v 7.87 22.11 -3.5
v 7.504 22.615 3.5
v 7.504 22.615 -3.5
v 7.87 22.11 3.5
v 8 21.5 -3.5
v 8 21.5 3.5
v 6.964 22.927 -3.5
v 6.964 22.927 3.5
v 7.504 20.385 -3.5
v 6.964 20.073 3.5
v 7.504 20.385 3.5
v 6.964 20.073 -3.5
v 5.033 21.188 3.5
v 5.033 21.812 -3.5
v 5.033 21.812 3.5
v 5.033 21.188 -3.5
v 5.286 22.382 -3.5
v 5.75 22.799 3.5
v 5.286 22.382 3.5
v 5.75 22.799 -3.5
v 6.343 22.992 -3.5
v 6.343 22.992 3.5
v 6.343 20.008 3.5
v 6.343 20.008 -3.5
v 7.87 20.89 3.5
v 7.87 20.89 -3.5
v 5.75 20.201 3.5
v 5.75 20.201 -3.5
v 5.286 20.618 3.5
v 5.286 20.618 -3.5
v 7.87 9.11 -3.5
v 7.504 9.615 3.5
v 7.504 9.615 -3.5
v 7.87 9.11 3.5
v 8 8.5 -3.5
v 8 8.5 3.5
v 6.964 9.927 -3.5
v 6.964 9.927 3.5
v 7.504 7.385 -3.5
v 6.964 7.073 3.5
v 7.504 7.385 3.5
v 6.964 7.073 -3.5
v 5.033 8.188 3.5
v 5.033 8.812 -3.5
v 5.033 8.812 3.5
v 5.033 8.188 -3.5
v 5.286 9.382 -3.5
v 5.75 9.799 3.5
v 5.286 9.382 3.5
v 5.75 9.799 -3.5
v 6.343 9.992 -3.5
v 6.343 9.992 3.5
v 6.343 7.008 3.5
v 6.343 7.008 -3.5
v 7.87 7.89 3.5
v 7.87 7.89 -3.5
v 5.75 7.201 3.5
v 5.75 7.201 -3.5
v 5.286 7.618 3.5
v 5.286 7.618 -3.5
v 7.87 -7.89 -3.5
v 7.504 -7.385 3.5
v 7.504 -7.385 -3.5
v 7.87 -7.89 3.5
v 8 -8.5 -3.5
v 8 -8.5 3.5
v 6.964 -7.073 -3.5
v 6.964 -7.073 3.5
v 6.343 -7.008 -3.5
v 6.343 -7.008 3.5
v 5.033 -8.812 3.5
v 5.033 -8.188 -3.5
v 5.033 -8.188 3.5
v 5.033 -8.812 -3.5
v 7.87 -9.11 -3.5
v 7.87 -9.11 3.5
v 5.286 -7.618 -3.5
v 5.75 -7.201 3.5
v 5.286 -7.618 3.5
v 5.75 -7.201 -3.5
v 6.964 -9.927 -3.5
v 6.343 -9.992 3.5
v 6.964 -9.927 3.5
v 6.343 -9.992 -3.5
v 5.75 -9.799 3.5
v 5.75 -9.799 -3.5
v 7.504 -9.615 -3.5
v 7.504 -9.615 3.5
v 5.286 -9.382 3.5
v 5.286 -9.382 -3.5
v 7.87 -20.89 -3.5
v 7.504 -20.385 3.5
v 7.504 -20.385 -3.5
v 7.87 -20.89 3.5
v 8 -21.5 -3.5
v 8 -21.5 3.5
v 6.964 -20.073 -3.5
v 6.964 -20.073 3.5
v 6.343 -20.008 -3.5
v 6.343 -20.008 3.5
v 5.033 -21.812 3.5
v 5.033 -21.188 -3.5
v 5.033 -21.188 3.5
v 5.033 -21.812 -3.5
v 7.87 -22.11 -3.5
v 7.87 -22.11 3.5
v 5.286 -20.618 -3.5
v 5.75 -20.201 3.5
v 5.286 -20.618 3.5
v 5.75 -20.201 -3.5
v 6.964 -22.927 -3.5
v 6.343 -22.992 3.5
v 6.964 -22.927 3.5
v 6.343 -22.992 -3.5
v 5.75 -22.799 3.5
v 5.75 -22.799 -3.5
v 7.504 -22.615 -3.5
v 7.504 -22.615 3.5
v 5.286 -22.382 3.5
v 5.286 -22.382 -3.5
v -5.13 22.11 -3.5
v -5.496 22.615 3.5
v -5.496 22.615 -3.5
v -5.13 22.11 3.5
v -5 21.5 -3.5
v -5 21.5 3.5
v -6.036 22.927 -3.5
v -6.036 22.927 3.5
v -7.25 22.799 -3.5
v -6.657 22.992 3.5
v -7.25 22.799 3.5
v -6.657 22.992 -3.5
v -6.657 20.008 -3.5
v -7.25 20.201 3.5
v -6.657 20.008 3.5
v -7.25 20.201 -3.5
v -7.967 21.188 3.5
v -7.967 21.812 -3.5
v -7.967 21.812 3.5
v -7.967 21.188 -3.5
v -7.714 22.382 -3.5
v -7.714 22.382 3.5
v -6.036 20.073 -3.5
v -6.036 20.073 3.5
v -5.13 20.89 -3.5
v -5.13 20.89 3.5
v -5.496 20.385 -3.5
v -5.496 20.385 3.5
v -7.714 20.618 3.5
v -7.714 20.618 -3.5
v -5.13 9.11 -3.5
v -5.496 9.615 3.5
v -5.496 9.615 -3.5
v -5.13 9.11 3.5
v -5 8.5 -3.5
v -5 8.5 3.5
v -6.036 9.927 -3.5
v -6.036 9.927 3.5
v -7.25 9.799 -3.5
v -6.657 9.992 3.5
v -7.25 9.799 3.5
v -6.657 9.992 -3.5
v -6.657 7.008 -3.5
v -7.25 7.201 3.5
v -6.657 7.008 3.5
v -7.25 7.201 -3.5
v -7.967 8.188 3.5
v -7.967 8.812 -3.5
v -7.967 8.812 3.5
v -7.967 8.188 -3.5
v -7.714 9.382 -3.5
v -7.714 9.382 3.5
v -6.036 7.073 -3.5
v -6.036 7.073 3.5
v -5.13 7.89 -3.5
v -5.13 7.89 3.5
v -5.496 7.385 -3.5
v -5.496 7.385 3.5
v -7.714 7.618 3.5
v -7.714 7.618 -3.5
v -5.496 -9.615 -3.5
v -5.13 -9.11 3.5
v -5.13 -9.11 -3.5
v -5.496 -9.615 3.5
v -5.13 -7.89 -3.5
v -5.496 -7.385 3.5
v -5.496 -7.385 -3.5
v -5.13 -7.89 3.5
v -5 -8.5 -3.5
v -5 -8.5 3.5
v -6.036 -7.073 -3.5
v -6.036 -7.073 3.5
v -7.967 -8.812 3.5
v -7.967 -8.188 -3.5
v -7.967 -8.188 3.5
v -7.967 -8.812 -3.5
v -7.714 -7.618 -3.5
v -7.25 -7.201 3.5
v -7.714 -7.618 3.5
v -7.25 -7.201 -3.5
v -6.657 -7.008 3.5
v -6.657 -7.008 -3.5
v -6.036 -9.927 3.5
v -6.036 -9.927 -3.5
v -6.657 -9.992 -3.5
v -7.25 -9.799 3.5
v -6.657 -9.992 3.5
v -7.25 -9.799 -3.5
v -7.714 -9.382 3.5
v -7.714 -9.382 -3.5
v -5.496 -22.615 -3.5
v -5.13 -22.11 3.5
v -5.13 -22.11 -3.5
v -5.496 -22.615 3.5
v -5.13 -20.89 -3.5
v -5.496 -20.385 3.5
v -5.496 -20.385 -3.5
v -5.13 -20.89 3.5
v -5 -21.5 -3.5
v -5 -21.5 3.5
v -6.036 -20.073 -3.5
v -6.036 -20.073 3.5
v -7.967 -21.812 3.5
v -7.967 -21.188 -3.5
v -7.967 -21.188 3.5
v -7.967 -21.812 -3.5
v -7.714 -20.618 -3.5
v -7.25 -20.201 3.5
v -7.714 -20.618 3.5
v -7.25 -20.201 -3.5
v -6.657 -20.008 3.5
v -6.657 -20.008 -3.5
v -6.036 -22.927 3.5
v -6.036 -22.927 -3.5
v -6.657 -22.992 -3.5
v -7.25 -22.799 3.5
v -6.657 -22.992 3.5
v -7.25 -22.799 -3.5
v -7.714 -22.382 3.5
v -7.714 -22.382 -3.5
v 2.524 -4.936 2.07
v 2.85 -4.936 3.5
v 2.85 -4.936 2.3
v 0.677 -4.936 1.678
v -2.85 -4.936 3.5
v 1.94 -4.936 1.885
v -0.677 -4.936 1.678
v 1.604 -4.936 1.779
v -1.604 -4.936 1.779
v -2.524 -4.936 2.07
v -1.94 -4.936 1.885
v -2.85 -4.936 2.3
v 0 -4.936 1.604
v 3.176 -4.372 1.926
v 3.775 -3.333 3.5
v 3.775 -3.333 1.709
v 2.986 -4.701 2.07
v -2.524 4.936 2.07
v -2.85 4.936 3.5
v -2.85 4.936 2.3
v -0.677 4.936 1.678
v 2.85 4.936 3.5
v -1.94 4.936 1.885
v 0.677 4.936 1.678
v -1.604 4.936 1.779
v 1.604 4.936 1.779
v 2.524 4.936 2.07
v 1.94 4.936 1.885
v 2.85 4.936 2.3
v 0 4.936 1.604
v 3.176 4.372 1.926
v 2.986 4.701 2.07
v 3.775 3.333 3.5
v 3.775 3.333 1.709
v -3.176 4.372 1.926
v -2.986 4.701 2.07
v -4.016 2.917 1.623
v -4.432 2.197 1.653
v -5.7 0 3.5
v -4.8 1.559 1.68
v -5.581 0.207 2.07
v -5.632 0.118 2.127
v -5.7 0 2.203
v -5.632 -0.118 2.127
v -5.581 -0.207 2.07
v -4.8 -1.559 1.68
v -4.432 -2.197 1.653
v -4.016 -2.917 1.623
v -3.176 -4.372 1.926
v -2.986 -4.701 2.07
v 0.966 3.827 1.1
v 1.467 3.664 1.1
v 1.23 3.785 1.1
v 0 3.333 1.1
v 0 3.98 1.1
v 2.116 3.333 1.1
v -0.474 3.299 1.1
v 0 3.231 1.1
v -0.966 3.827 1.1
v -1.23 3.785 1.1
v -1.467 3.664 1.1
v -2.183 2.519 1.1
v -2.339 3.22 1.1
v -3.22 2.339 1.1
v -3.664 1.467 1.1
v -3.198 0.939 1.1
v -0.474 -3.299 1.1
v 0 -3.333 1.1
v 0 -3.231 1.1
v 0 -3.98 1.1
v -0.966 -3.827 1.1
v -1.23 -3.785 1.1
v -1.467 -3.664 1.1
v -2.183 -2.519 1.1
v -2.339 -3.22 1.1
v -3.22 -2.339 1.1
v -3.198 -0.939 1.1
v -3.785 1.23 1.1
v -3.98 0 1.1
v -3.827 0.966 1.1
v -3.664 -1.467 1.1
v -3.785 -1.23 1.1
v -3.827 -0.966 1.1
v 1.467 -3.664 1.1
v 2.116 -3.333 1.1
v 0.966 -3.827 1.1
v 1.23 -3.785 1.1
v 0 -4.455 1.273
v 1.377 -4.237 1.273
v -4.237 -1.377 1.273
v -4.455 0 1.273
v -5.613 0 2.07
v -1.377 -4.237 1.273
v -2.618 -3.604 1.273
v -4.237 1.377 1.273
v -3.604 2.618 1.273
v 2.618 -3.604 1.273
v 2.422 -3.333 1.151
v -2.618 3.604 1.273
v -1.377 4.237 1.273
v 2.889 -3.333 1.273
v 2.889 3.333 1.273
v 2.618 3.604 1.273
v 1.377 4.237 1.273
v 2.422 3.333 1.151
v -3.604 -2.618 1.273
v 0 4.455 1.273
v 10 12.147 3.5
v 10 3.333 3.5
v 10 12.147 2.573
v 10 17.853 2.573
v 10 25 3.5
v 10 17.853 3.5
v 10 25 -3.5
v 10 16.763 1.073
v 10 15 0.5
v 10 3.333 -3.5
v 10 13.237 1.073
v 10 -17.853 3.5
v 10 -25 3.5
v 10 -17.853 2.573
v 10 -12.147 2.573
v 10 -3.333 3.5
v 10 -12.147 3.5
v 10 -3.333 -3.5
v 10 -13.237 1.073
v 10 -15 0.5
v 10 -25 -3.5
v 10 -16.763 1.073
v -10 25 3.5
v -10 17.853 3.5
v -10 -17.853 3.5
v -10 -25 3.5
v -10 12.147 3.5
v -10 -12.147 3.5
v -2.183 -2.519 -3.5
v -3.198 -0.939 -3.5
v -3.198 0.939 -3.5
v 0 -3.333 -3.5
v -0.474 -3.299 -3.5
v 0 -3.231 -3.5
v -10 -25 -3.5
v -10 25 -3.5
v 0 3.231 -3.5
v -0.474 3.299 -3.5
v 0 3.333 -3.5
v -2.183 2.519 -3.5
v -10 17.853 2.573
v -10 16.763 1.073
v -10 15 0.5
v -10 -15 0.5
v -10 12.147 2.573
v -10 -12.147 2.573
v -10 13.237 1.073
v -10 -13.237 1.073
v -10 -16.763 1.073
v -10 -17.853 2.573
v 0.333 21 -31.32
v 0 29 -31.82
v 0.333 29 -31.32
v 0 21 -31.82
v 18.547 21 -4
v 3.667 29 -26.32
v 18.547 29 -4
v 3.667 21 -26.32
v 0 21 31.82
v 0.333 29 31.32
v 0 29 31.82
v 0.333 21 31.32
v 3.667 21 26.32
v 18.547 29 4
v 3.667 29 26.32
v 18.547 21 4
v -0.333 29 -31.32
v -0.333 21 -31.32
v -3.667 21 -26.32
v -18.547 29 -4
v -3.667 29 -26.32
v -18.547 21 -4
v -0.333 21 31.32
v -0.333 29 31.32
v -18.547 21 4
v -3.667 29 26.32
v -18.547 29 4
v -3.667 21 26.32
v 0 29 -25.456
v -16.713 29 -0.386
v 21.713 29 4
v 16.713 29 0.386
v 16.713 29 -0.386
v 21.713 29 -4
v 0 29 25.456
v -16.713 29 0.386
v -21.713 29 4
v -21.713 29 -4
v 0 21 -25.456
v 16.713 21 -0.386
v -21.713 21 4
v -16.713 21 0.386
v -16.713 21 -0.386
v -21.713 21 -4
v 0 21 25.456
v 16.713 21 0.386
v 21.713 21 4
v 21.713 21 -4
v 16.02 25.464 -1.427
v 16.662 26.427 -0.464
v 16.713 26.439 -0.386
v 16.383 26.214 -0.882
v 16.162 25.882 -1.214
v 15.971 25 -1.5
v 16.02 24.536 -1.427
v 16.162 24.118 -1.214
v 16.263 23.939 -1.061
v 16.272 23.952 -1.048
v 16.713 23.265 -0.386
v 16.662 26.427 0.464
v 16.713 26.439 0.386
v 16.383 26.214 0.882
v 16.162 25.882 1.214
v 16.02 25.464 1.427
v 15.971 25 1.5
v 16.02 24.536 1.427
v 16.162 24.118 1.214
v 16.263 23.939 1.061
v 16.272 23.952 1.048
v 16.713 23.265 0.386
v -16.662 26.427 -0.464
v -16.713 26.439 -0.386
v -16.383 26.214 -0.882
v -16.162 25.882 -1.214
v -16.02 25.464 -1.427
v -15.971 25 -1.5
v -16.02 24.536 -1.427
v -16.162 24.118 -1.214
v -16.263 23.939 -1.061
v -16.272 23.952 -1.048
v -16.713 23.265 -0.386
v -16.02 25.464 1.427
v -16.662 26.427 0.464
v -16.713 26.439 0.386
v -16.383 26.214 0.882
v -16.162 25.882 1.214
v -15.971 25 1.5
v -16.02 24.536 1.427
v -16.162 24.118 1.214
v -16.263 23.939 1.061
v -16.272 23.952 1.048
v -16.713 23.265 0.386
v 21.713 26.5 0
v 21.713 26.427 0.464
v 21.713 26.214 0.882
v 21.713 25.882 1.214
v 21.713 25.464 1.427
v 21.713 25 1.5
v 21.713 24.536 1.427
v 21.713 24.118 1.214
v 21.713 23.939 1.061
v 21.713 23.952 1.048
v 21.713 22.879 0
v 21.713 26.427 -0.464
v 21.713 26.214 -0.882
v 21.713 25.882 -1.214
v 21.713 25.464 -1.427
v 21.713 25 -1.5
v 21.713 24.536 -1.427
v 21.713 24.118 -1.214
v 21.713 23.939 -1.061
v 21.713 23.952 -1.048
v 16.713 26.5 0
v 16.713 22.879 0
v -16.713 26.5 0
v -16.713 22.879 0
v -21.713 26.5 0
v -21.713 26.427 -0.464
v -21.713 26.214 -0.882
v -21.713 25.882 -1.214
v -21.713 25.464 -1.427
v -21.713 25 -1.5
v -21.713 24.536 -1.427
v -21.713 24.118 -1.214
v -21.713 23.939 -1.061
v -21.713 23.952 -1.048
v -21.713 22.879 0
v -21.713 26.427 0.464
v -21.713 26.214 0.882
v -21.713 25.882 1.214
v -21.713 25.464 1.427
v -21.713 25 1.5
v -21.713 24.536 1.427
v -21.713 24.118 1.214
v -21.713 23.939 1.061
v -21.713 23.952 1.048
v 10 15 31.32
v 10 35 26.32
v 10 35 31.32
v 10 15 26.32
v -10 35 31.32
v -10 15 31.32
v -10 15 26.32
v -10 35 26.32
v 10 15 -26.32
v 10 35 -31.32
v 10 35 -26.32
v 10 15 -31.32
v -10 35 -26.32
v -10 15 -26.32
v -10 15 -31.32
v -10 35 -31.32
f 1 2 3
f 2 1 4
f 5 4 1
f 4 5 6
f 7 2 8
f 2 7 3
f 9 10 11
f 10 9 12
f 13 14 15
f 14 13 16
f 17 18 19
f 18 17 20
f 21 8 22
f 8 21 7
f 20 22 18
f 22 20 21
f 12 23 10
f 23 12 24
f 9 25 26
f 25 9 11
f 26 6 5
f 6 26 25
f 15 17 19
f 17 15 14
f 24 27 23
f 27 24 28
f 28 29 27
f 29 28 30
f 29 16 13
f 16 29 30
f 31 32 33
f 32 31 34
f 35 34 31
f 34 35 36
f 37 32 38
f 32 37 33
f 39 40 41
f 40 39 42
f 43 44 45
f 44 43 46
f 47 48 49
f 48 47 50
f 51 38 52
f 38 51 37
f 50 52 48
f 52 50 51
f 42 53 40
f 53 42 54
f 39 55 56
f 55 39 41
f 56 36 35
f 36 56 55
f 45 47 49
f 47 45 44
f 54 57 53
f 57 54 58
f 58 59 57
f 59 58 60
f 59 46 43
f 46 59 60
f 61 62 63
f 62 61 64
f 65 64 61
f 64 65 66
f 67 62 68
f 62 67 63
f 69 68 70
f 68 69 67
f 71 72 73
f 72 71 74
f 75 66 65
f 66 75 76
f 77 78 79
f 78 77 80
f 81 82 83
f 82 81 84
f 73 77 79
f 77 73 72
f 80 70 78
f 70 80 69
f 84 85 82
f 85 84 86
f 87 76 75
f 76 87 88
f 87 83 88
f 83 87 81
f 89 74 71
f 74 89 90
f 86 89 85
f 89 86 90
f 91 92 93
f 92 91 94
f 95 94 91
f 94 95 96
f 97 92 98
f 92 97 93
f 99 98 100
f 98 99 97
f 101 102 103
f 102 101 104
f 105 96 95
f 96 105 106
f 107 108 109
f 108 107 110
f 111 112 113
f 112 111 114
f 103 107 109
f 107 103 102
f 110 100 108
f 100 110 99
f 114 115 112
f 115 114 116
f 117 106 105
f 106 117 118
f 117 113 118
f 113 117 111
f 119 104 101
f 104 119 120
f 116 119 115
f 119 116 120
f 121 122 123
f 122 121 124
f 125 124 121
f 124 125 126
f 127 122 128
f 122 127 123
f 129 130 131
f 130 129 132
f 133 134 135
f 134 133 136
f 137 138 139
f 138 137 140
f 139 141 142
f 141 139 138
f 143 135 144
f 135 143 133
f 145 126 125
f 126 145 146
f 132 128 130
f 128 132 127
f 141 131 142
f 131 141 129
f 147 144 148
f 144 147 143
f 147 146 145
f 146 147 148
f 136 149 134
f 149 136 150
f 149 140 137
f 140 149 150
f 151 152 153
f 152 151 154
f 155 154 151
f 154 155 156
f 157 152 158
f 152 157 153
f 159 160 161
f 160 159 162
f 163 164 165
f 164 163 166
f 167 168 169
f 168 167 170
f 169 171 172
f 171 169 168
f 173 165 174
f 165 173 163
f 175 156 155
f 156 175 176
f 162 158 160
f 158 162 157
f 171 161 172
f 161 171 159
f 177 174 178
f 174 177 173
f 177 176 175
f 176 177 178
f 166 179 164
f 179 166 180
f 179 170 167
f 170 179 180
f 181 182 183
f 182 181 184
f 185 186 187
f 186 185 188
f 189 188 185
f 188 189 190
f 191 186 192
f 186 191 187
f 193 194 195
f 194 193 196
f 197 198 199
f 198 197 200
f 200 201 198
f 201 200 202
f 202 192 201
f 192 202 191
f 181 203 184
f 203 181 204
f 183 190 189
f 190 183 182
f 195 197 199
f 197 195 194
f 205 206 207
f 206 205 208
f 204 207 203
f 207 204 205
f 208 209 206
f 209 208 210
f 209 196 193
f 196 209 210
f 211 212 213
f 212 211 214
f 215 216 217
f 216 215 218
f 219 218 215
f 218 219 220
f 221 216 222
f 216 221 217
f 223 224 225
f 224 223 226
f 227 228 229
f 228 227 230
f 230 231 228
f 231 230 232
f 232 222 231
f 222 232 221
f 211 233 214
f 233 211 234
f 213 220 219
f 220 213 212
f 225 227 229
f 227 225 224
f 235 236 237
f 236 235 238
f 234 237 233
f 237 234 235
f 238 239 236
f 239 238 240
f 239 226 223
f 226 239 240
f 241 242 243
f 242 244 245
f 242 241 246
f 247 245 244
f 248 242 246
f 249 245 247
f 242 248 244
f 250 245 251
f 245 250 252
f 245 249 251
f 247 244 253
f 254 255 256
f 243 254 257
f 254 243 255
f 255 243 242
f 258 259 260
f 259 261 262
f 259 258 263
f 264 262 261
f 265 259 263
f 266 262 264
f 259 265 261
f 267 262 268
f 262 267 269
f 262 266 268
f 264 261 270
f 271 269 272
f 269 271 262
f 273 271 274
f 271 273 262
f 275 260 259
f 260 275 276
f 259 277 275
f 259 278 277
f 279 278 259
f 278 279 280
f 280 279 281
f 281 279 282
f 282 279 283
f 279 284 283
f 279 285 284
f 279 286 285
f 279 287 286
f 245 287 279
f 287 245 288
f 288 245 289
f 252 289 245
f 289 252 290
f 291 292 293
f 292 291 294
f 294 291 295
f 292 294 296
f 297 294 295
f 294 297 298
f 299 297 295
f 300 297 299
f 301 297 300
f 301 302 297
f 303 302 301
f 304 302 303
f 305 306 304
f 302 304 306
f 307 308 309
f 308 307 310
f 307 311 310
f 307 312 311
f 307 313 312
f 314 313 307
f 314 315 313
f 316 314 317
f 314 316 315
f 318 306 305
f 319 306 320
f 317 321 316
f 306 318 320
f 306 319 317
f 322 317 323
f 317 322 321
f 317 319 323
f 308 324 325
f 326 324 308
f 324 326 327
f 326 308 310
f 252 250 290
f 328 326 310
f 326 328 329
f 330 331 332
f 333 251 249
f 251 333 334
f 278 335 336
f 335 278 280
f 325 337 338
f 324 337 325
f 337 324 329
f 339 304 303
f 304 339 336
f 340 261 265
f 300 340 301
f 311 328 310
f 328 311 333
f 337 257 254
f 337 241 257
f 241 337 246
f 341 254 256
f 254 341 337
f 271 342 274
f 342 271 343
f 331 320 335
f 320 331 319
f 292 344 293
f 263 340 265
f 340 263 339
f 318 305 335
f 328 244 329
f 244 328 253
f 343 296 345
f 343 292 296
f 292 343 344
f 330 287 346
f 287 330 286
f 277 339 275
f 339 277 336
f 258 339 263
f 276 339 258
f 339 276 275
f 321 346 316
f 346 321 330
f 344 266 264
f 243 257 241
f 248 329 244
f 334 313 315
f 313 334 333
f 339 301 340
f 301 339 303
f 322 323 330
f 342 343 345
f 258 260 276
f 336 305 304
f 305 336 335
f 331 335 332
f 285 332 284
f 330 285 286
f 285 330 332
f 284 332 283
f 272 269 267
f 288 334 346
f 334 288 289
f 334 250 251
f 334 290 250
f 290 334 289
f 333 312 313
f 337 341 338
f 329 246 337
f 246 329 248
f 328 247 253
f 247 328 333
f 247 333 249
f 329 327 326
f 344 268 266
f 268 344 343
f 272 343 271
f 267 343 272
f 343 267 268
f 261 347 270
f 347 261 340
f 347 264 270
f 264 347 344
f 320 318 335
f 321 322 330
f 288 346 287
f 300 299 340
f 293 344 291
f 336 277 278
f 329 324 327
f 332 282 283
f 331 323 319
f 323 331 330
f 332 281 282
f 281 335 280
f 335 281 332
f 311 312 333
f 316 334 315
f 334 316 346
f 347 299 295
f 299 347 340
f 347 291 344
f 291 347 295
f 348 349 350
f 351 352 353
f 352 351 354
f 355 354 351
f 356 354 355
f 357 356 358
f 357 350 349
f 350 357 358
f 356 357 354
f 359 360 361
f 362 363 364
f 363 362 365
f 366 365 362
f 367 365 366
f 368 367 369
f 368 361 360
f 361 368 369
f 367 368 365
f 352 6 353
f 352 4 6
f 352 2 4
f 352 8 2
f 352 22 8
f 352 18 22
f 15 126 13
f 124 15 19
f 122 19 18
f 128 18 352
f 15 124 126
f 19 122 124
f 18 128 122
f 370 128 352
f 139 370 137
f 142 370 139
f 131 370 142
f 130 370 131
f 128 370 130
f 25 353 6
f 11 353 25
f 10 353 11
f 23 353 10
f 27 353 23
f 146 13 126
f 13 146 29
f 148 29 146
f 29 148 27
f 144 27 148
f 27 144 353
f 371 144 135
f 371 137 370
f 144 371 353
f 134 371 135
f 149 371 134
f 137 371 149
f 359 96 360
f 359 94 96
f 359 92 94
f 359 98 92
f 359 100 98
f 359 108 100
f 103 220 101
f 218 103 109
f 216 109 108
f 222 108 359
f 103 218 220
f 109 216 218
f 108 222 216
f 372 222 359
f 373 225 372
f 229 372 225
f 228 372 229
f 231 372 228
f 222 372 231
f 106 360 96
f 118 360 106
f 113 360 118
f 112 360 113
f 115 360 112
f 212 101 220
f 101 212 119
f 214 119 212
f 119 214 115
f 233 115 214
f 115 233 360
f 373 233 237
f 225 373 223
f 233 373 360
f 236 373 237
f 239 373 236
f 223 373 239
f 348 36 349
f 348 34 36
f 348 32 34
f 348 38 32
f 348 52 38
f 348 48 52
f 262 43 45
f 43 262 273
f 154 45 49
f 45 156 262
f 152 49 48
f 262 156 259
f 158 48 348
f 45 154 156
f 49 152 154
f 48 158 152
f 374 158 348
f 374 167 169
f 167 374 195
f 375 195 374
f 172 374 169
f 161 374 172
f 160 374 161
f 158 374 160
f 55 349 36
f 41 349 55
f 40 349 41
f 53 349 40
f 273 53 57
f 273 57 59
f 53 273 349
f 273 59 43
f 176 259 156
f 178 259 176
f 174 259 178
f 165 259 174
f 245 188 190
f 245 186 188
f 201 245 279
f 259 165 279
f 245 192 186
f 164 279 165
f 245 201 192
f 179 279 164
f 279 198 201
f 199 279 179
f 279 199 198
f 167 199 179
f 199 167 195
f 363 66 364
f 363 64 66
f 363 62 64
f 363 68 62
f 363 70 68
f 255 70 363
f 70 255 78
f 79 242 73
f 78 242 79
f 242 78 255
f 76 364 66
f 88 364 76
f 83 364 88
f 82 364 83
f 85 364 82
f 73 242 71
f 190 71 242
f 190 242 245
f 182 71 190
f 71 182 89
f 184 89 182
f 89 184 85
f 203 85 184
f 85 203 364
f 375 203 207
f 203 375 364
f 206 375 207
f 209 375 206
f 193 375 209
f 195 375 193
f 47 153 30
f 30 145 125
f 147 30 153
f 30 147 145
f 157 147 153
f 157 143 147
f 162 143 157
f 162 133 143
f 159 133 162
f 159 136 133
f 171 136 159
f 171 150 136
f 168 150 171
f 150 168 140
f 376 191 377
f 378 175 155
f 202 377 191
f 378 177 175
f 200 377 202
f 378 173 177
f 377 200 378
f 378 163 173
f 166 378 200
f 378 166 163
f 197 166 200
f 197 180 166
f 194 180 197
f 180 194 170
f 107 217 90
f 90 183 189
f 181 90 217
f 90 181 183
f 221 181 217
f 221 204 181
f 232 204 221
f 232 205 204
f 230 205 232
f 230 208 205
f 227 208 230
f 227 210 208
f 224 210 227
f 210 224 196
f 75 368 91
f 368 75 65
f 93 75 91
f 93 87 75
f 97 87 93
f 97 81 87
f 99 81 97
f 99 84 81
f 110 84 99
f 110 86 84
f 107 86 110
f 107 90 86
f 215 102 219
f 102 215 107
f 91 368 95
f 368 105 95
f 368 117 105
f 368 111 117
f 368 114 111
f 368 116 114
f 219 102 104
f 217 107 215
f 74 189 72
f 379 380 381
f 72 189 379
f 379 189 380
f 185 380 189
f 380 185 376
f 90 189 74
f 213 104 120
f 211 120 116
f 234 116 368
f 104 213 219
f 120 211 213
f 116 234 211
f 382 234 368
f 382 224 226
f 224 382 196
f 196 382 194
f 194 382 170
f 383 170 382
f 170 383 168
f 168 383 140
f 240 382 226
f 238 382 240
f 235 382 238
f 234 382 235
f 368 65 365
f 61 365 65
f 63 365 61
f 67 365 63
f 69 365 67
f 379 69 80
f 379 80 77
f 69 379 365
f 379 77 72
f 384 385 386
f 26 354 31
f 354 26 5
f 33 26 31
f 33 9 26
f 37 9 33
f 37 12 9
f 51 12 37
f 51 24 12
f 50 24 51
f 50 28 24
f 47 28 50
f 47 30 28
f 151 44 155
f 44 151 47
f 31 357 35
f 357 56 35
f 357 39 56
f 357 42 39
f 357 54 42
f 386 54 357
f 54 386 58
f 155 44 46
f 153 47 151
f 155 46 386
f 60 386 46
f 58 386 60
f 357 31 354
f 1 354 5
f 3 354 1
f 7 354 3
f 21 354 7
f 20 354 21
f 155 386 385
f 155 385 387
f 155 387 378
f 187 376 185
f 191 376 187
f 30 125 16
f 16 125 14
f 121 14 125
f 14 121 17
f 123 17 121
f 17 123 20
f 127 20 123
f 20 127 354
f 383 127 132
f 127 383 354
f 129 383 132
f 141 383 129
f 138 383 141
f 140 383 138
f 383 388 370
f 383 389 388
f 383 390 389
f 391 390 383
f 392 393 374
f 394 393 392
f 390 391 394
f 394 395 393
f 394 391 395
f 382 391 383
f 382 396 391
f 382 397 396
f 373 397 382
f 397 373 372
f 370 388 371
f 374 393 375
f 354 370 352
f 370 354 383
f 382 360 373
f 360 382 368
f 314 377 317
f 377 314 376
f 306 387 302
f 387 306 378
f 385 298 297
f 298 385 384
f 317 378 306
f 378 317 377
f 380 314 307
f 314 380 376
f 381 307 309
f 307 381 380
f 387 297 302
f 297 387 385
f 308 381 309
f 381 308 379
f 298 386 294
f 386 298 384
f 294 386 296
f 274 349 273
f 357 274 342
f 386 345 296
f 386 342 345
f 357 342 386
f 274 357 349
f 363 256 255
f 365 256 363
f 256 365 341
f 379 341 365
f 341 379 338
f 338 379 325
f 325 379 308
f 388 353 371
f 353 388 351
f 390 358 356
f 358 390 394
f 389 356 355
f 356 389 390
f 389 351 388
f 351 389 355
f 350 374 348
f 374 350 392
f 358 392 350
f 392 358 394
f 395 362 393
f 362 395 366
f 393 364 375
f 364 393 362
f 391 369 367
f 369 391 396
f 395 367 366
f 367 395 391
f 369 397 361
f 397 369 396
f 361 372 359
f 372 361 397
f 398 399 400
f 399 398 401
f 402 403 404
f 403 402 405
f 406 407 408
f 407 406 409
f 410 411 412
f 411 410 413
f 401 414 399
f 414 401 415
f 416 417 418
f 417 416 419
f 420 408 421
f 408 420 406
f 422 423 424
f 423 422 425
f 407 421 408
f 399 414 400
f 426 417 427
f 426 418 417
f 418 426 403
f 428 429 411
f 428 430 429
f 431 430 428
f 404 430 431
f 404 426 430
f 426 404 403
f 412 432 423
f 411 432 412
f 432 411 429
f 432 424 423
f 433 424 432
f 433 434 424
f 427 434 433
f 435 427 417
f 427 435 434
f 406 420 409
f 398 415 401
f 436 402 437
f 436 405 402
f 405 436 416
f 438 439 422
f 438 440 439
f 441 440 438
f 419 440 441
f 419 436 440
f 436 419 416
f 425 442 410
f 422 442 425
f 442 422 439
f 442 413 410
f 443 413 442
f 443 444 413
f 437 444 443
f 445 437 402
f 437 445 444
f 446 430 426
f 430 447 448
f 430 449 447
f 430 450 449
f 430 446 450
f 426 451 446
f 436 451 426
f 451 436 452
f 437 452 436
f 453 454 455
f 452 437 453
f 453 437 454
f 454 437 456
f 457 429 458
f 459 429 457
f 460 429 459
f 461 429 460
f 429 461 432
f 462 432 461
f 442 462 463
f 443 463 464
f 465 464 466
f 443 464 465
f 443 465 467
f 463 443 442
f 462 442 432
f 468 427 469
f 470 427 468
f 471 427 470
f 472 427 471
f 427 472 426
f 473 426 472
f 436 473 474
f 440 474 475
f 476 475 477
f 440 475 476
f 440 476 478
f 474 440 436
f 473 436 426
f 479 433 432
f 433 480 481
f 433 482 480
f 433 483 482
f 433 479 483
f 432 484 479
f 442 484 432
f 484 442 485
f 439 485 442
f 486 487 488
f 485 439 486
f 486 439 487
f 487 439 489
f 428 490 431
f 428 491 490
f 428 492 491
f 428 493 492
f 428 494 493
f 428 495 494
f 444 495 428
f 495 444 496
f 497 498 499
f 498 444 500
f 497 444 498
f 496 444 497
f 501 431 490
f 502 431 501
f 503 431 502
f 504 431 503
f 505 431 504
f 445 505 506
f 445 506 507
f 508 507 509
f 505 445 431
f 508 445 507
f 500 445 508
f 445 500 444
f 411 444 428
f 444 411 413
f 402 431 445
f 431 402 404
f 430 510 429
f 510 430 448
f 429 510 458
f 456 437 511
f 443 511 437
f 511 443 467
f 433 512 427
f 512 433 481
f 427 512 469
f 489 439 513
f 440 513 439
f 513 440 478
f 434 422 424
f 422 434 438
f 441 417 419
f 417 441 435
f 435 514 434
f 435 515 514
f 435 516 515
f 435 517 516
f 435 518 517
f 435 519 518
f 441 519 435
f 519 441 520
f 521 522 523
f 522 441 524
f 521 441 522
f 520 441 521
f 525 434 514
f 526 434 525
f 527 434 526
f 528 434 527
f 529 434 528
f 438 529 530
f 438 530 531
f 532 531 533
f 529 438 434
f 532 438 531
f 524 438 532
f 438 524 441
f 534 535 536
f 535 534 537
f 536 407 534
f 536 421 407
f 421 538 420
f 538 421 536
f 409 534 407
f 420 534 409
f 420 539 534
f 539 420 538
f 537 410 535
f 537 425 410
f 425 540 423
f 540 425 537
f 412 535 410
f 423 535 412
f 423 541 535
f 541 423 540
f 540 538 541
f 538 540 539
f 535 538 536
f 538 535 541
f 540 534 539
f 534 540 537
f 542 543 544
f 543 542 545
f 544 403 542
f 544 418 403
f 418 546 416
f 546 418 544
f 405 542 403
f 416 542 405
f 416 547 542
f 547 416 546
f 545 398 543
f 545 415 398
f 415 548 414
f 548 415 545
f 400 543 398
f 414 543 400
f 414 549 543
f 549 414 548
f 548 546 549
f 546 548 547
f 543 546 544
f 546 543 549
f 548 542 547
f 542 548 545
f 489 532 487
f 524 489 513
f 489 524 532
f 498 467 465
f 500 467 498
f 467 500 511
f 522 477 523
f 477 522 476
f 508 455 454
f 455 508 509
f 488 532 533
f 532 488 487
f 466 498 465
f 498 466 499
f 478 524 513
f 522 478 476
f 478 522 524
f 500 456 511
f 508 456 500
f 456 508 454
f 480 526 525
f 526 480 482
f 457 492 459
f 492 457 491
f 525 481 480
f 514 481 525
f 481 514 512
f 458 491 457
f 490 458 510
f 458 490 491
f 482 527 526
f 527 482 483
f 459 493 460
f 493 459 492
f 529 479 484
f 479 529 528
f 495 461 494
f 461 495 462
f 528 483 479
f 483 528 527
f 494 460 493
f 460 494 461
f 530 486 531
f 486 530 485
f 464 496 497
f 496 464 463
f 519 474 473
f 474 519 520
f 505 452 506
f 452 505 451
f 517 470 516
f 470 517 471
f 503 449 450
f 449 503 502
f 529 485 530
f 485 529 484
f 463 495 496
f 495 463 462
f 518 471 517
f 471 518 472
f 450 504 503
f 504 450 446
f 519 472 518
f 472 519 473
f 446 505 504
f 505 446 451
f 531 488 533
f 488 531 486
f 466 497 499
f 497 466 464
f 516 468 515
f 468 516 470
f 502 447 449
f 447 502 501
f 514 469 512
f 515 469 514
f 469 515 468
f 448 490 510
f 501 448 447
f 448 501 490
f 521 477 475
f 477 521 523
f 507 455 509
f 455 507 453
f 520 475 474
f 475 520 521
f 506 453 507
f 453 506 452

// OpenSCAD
// file: library.scad
include <parameters.scad>;


// inner and outer product.  Why aren't these standard?!!!?

function ip(v1 = [0,0,0], v2 = [0,0,0]) = v1.x*v2.x + v1.y*v2.y + v1.z*v2.z;

function op(v1 = [0,0,0], v2 = [0,0,0]) = [v1.y*v2.z - v1.z*v2.y, v1.z*v2.x - v1.x*v2.z, v1.x*v2.y - v1.y*v2.x];


/*
  This makes an angled strut in space between two points.  It is parallel to one of the
  coordinate planes, which means that one coordinate of the two endpoints must be the same.


module strut(p1=[0,0,0], p2=[0,0,1], deep = 5, wide = 10)
{
	if(abs(p1.x - p2.x) < 0.00001)
	{

	} else if(abs(p1.y - p2.y) < 0.00001)
	{

	} else
	{

		cube([sqrt(

	}
}
*/

/*
  This gives either a NEMA 14 stepper motor or its mounting holes.

  If body is true, you get the motor.  If it is false you get the screw holes and central
  hole needed to mount the motor.  If counterbore is positive and you are generating the mounting holes
  then the screw holes will get fat to accomodate a cap-screw head counterbore mm away from the face 
  of the motor.  For no counterbores, set counterbore negative.

*/

module nema14(body = true, counterbore = -1)
{
	color([1,0.4,0.4,1])
	union()
	{
		if(body)
		{
			translate([0, 0, nema14_shaft_length/2 - nema14_shaft_projection - nema14_hub_depth])
				cylinder(r = nema14_shaft/2, h = nema14_shaft_length, center = true, $fn=20);
			translate([0, 0, -nema14_hub_depth])
				cylinder(r = nema14_hub/2, h = nema14_hub_depth*2, center = true, $fn=20);
	
			translate([0, 0, nema14_length/2])
				cube([nema14_square,nema14_square,nema14_length], center = true);
		} else
			translate([0, 0, -20])
				cylinder(r = nema14_hub/2 + 1, h = 50, center = true, $fn=20);

		if(!body)
		{
			union()
			{
				for ( x = [0:1] ) 
				for ( y = [0:1] )
				{
					translate([(x-0.5)*nema14_screws, (y-0.5)*nema14_screws, -20])
						cylinder(r = screwsize/2, h = 50, center = true, $fn=10);
					if(counterbore >= 0)
						translate([(x-0.5)*nema14_screws, (y-0.5)*nema14_screws, -25-counterbore])
							cylinder(r = screwsize, h = 50, center = true, $fn=10);
				}
			}
		}
	}


}


// Pentagon nut that matches a hexagon...

module pentanut(height=40)
{
	rotate([0,0,60])
	intersection()
	{
		translate([-nutsize,-nutsize*5,-20])
			cube([nutsize*10, nutsize*10,height]);
		rotate([0,0,60])
			translate([-nutsize,-nutsize*5,-20])
				cube([nutsize*10, nutsize*10,height]);
		rotate([0,0,120])
			translate([-nutsize,-nutsize*5,-20])
				cube([nutsize*10, nutsize*10,height]);
		rotate([0,0,180])
			translate([-nutsize,-nutsize*5,-20])
				cube([nutsize*10, nutsize*10,height]);
		rotate([0,0,240])
			translate([-nutsize,-nutsize*5,-20])
				cube([nutsize*10, nutsize*10,height]);
	}
}


// Make a RepRap teardrop with its axis along Z
// If truncated is true, chop the apex; if not, come to a point

// I stole this function from Erik...


module teardrop(r=1.5, h=20, truncateMM=0.5)
{
	union()
	{
		if(truncateMM > 0)
		{
			intersection()
			{
				translate([truncateMM,0,h/2]) 
					scale([1,1,h])
						cube([r*2.8275,r*2,1],center=true);
				scale([1,1,h]) 
						rotate([0,0,3*45])
							cube([r,r,1]);
			}
		} else
		{
			scale([1,1,h])
				rotate([0,0,3*45])
					cube([r,r,1]);
		}
		cylinder(r=r, h = h, $fn=20);
	}
}


// Make a ball-bearing holder cutout

module bearing_holder(radius = 6.5)
{
	union()
	{
		cylinder (h = radius*20, r = radius, center = true, $fn = 20);
		for(i=[0:2])
		{
			rotate([0,0,120*i])
				translate([radius+screwsize/2, 0, 0])
					union()
					{
						cylinder (h = radius*20, r = screwsize/2, center = true, $fn = 20);
						translate([-screwsize, 0, 0])
							cube([2*screwsize, screwsize, radius*20], center = true);
					}
		}
	}
}

// Make a cuboid with a 45 degree top for vertical slots etc

module cen_hat(size)
{
	translate([0, 0, size.x/sqrt(2)])
		union()
		{
			rotate([0, 45, 0])
				cube([size.x, size.y, 5*max(size.x, max(size.y, size.z))], center=true);
			rotate([0, -45, 0])
				cube([size.x, size.y, 5*max(size.x, max(size.y, size.z))], center=true);
		}
}

module hat_cube(size = [1,1,1], center = false)
{
	difference()
	{
		cube(size, center);
		if(center)
			translate([0, 0, size.z/2])
				cen_hat(size);
		else
			translate([size.x/2, size.y/2, size.z])
				cen_hat(size);
	}
}



module rod(length, threaded) if (threaded && renderrodthreads) {
	linear_extrude(height = length, center = true, convexity = 10, twist = -360 * length / rodpitch, $fn = fn)
		translate([rodsize * 0.1 / 2, 0, 0])
			circle(r = rodsize * 0.9 / 2, $fn = fn);
} else cylinder(h = length, r = rodsize / 2, center = true, $fn = fn);


module rodnut(position, washer) render() translate([0, 0, position]) {
	intersection() {
		scale([1, 1, 0.5]) sphere(r = 1.05 * rodsize, center = true);
		difference() {
			cylinder (h = rodnutsize, r = rodnutdiameter / 2, center = true, $fn = 6);
			rod(rodnutsize + 0.1);
		}
	}
	if (washer == 1 || washer == 4) rodwasher(((position > 0) ? -1 : 1) * (rodnutsize + rodwashersize) / 2);
	if (washer == 2 || washer == 4) rodwasher(((position > 0) ? 1 : -1) * (rodnutsize + rodwashersize) / 2);
}


module rodwasher(position) render() translate ([0, 0, position]) difference() {
	cylinder(r = rodwasherdiameter / 2, h = rodwashersize, center = true, $fn = fn);
	rod(rodwashersize + 0.1);
}


module screw(length, nutpos, washer, bearingpos = -1) union(){
	translate([0, 0, -length / 2]) if (renderscrewthreads) {
		linear_extrude(height = length, center = true, convexity = 10, twist = -360 * length / screwpitch, $fn = fn)
			translate([screwsize * 0.1 / 2, 0, 0])
				circle(r = screwsize * 0.9 / 2, $fn = fn);
	} else cylinder(h = length, r = screwsize / 2, center = true, $fn = fn);
	render() difference() {
		translate([0, 0, screwsize / 2]) cylinder(h = screwsize, r = screwsize, center = true, $fn = fn);
		translate([0, 0, screwsize]) cylinder(h = screwsize, r = screwsize / 2, center = true, $fn = 6);
	}
	if (washer > 0 && nutpos > 0) {
		washer(nutpos);
		nut(nutpos + washersize);
	} else if (nutpos > 0) nut(nutpos);
	if (bearingpos >= 0) bearing(bearingpos);
}


module bearing(position) render() translate([0, 0, -position - bearingwidth / 2]) union() {
	difference() {
		cylinder(h = bearingwidth, r = bearingsize / 2, center = true, $fn = fn);
		cylinder(h = bearingwidth * 2, r = bearingsize / 2 - 1, center = true, $fn = fn);
	}
	difference() {
		cylinder(h = bearingwidth - 0.5, r = bearingsize / 2 - 0.5, center = true, $fn = fn);
		cylinder(h = bearingwidth * 2, r = screwsize / 2 + 0.5, center = true, $fn = fn);
	}
	difference() {
		cylinder(h = bearingwidth, r = screwsize / 2 + 1, center = true, $fn = fn);
		cylinder(h = bearingwidth + 0.1, r = screwsize / 2, center = true, $fn = fn);
	}
}


module nut(position, washer) render() translate([0, 0, -position - nutsize / 2]) {
	intersection() {
		scale([1, 1, 0.5]) sphere(r = 1.05 * screwsize, center = true);
		difference() {
			cylinder (h = nutsize, r = nutdiameter / 2, center = true, $fn = 6);
			cylinder(r = screwsize / 2, h = nutsize + 0.1, center = true, $fn = fn);
		}
	}
	if (washer > 0) washer(0);
}


module washer(position) render() translate ([0, 0, -position - washersize / 2]) difference() {
	cylinder(r = washerdiameter / 2, h = washersize, center = true, $fn = fn);
	cylinder(r = screwsize / 2, h = washersize + 0.1, center = true, $fn = fn);
}


//rod(20);
//translate([rodsize * 2.5, 0, 0]) rod(20, true);
//translate([rodsize * 5, 0, 0]) screw(10, true);
//translate([rodsize * 7.5, 0, 0]) bearing();
//translate([rodsize * 10, 0, 0]) rodnut();
//translate([rodsize * 12.5, 0, 0]) rodwasher();
//translate([rodsize * 15, 0, 0]) nut();
//translate([rodsize * 17.5, 0, 0]) washer();

//hat_cube(size=[2,40,2], center=false);

//bearing_holder();

//teardrop();

//pentanut();

//nema14(body = true, counterbore = -1);
// file: parameters.scad
// Parameters file for RepRap Huxley

pi=3.14159265;

// The relative location in your file system where the .dxf files are
// DXFs are for quick development.  They should be replaced by parameterised CSG in dure course.

fileroot="DXF-files/";

rodsize = 6;	//threaded/smooth rod diameter in mm
xaxis = 182.5;	//width of base in mm
yaxis = 266.5;	//length of base in mm


screwsize = 3;	//bearing bore/screw diameter in mm
bearingsize = 10;	//outer diameter of bearings in mm
bearingwidth = 4;	//width of bearings in mm


rodpitch = rodsize / 6;
rodnutsize = 0.8 * rodsize;
rodnutdiameter = 1.9 * rodsize;
rodwashersize = 0.2 * rodsize;
rodwasherdiameter = 2 * rodsize;
screwpitch = screwsize / 6;
nutsize = 0.8 * screwsize;
nutdiameter = 1.9 * screwsize;
washersize = 0.2 * screwsize;
washerdiameter = 2 * screwsize;
partthick = 2 * rodsize;
vertexrodspace = 2 * rodsize;


c = [0.3, 0.3, 0.3];
rodendoffset = rodnutsize + rodwashersize * 2 + partthick / 2;
vertexoffset = vertexrodspace + rodendoffset;


renderrodthreads = false;
renderscrewthreads = false;
fn = 36;

// The gap between the joining rods at a vertex

vertex_radius=sqrt(rodsize*rodsize + vertexoffset*vertexoffset);
vertex_ang = atan(vertexoffset/rodsize)-30;
vertex_gap = 2*vertex_radius*cos(vertex_ang);

// Nema 14 dimensions - these are absolute

nema14_square=35.3;
nema14_screws=26;
nema14_hub=22;
nema14_hub_depth=2;
nema14_length=36;
nema14_shaft=5;
nema14_shaft_length=66;
nema14_shaft_projection=19;

// Limit switch parameters

limit_switch_hole_diameter=2.5;
limit_switch_centres=9.5;

// The RepRap slide bearings

bearing_mount_centres=18;
bearing_width=7;

// X axis parameters - many should be relative

x_bar_gap=30;
motor_center_y = 26;
bar_clamp_x=5;
bar_clamp_y=8;
bar_clamp_x_gap=23;
bearing_y=50;
bearing_x=bar_clamp_x_gap + 10;
hole_land=4;
thickness=5;
bearing_low_z = 8;
bearing_z_gap = 25;
bearing_plate_width = bearing_mount_centres+2*hole_land + 10;
bearing_plate_overlap=0.5;
bearing_plate_support=10;
// main file
include <parameters.scad>;
use <library.scad>;

clamp_holes=13;

module x_axis_z_nut_holder()
{
	difference()
	{
		cube([20,50,7], center=true);
		cylinder(r=rodsize/1.8, h= rodsize*10, center=true);
		translate([10,0,0])
		cube([20,2*rodsize/1.8,30], center=true);

		translate([0,x_bar_gap/2,7/2])
			rotate([0,90,0])
				cylinder(r=rodsize/2, h= rodsize*10, center=true);

		translate([0,-x_bar_gap/2,7/2])
			rotate([0,90,0])
				cylinder(r=rodsize/2, h= rodsize*10, center=true);

		for(a = [1, -1])
		for(b = [1, -1])
		for(c = [1, -1])
		translate([a*clamp_holes/2,b*x_bar_gap/2+c*clamp_holes/2,0])
				cylinder(r=screwsize/2, h= rodsize*10, center=true, $fn=15);
		translate([0,0,7/2])
			rodnut(position=0,washer=0);
	}
}

stretch=1.5;

module z_height_adjuster()
{
	difference()
	{
		union()
		{
			scale([1,1,stretch])
				rotate([0,45,0])
					difference()
					{
						cube([30,8,30],center=true);
						cube([24,20,24],center=true);
					}
			translate([15*sqrt(2)-2,0,0])
				cube([5,8,8],center=true);
	
			translate([-15*sqrt(2)+2,0,0])
				cube([5,8,8],center=true);

			translate([0,0,stretch*(15*sqrt(2)-2)])
				cube([20,20,5],center=true);
	
			translate([0,0,stretch*(-15*sqrt(2)+2)])
				cube([20,20,5],center=true);
		}
		translate([-50,0,0])
			rotate([90,0,0])
				rotate([0,90,0])
					teardrop(r=screwsize/2,h=100,truncateMM=-1);
	}
}

x_axis_z_nut_holder();

translate([0,25,0])
z_height_adjuster();
